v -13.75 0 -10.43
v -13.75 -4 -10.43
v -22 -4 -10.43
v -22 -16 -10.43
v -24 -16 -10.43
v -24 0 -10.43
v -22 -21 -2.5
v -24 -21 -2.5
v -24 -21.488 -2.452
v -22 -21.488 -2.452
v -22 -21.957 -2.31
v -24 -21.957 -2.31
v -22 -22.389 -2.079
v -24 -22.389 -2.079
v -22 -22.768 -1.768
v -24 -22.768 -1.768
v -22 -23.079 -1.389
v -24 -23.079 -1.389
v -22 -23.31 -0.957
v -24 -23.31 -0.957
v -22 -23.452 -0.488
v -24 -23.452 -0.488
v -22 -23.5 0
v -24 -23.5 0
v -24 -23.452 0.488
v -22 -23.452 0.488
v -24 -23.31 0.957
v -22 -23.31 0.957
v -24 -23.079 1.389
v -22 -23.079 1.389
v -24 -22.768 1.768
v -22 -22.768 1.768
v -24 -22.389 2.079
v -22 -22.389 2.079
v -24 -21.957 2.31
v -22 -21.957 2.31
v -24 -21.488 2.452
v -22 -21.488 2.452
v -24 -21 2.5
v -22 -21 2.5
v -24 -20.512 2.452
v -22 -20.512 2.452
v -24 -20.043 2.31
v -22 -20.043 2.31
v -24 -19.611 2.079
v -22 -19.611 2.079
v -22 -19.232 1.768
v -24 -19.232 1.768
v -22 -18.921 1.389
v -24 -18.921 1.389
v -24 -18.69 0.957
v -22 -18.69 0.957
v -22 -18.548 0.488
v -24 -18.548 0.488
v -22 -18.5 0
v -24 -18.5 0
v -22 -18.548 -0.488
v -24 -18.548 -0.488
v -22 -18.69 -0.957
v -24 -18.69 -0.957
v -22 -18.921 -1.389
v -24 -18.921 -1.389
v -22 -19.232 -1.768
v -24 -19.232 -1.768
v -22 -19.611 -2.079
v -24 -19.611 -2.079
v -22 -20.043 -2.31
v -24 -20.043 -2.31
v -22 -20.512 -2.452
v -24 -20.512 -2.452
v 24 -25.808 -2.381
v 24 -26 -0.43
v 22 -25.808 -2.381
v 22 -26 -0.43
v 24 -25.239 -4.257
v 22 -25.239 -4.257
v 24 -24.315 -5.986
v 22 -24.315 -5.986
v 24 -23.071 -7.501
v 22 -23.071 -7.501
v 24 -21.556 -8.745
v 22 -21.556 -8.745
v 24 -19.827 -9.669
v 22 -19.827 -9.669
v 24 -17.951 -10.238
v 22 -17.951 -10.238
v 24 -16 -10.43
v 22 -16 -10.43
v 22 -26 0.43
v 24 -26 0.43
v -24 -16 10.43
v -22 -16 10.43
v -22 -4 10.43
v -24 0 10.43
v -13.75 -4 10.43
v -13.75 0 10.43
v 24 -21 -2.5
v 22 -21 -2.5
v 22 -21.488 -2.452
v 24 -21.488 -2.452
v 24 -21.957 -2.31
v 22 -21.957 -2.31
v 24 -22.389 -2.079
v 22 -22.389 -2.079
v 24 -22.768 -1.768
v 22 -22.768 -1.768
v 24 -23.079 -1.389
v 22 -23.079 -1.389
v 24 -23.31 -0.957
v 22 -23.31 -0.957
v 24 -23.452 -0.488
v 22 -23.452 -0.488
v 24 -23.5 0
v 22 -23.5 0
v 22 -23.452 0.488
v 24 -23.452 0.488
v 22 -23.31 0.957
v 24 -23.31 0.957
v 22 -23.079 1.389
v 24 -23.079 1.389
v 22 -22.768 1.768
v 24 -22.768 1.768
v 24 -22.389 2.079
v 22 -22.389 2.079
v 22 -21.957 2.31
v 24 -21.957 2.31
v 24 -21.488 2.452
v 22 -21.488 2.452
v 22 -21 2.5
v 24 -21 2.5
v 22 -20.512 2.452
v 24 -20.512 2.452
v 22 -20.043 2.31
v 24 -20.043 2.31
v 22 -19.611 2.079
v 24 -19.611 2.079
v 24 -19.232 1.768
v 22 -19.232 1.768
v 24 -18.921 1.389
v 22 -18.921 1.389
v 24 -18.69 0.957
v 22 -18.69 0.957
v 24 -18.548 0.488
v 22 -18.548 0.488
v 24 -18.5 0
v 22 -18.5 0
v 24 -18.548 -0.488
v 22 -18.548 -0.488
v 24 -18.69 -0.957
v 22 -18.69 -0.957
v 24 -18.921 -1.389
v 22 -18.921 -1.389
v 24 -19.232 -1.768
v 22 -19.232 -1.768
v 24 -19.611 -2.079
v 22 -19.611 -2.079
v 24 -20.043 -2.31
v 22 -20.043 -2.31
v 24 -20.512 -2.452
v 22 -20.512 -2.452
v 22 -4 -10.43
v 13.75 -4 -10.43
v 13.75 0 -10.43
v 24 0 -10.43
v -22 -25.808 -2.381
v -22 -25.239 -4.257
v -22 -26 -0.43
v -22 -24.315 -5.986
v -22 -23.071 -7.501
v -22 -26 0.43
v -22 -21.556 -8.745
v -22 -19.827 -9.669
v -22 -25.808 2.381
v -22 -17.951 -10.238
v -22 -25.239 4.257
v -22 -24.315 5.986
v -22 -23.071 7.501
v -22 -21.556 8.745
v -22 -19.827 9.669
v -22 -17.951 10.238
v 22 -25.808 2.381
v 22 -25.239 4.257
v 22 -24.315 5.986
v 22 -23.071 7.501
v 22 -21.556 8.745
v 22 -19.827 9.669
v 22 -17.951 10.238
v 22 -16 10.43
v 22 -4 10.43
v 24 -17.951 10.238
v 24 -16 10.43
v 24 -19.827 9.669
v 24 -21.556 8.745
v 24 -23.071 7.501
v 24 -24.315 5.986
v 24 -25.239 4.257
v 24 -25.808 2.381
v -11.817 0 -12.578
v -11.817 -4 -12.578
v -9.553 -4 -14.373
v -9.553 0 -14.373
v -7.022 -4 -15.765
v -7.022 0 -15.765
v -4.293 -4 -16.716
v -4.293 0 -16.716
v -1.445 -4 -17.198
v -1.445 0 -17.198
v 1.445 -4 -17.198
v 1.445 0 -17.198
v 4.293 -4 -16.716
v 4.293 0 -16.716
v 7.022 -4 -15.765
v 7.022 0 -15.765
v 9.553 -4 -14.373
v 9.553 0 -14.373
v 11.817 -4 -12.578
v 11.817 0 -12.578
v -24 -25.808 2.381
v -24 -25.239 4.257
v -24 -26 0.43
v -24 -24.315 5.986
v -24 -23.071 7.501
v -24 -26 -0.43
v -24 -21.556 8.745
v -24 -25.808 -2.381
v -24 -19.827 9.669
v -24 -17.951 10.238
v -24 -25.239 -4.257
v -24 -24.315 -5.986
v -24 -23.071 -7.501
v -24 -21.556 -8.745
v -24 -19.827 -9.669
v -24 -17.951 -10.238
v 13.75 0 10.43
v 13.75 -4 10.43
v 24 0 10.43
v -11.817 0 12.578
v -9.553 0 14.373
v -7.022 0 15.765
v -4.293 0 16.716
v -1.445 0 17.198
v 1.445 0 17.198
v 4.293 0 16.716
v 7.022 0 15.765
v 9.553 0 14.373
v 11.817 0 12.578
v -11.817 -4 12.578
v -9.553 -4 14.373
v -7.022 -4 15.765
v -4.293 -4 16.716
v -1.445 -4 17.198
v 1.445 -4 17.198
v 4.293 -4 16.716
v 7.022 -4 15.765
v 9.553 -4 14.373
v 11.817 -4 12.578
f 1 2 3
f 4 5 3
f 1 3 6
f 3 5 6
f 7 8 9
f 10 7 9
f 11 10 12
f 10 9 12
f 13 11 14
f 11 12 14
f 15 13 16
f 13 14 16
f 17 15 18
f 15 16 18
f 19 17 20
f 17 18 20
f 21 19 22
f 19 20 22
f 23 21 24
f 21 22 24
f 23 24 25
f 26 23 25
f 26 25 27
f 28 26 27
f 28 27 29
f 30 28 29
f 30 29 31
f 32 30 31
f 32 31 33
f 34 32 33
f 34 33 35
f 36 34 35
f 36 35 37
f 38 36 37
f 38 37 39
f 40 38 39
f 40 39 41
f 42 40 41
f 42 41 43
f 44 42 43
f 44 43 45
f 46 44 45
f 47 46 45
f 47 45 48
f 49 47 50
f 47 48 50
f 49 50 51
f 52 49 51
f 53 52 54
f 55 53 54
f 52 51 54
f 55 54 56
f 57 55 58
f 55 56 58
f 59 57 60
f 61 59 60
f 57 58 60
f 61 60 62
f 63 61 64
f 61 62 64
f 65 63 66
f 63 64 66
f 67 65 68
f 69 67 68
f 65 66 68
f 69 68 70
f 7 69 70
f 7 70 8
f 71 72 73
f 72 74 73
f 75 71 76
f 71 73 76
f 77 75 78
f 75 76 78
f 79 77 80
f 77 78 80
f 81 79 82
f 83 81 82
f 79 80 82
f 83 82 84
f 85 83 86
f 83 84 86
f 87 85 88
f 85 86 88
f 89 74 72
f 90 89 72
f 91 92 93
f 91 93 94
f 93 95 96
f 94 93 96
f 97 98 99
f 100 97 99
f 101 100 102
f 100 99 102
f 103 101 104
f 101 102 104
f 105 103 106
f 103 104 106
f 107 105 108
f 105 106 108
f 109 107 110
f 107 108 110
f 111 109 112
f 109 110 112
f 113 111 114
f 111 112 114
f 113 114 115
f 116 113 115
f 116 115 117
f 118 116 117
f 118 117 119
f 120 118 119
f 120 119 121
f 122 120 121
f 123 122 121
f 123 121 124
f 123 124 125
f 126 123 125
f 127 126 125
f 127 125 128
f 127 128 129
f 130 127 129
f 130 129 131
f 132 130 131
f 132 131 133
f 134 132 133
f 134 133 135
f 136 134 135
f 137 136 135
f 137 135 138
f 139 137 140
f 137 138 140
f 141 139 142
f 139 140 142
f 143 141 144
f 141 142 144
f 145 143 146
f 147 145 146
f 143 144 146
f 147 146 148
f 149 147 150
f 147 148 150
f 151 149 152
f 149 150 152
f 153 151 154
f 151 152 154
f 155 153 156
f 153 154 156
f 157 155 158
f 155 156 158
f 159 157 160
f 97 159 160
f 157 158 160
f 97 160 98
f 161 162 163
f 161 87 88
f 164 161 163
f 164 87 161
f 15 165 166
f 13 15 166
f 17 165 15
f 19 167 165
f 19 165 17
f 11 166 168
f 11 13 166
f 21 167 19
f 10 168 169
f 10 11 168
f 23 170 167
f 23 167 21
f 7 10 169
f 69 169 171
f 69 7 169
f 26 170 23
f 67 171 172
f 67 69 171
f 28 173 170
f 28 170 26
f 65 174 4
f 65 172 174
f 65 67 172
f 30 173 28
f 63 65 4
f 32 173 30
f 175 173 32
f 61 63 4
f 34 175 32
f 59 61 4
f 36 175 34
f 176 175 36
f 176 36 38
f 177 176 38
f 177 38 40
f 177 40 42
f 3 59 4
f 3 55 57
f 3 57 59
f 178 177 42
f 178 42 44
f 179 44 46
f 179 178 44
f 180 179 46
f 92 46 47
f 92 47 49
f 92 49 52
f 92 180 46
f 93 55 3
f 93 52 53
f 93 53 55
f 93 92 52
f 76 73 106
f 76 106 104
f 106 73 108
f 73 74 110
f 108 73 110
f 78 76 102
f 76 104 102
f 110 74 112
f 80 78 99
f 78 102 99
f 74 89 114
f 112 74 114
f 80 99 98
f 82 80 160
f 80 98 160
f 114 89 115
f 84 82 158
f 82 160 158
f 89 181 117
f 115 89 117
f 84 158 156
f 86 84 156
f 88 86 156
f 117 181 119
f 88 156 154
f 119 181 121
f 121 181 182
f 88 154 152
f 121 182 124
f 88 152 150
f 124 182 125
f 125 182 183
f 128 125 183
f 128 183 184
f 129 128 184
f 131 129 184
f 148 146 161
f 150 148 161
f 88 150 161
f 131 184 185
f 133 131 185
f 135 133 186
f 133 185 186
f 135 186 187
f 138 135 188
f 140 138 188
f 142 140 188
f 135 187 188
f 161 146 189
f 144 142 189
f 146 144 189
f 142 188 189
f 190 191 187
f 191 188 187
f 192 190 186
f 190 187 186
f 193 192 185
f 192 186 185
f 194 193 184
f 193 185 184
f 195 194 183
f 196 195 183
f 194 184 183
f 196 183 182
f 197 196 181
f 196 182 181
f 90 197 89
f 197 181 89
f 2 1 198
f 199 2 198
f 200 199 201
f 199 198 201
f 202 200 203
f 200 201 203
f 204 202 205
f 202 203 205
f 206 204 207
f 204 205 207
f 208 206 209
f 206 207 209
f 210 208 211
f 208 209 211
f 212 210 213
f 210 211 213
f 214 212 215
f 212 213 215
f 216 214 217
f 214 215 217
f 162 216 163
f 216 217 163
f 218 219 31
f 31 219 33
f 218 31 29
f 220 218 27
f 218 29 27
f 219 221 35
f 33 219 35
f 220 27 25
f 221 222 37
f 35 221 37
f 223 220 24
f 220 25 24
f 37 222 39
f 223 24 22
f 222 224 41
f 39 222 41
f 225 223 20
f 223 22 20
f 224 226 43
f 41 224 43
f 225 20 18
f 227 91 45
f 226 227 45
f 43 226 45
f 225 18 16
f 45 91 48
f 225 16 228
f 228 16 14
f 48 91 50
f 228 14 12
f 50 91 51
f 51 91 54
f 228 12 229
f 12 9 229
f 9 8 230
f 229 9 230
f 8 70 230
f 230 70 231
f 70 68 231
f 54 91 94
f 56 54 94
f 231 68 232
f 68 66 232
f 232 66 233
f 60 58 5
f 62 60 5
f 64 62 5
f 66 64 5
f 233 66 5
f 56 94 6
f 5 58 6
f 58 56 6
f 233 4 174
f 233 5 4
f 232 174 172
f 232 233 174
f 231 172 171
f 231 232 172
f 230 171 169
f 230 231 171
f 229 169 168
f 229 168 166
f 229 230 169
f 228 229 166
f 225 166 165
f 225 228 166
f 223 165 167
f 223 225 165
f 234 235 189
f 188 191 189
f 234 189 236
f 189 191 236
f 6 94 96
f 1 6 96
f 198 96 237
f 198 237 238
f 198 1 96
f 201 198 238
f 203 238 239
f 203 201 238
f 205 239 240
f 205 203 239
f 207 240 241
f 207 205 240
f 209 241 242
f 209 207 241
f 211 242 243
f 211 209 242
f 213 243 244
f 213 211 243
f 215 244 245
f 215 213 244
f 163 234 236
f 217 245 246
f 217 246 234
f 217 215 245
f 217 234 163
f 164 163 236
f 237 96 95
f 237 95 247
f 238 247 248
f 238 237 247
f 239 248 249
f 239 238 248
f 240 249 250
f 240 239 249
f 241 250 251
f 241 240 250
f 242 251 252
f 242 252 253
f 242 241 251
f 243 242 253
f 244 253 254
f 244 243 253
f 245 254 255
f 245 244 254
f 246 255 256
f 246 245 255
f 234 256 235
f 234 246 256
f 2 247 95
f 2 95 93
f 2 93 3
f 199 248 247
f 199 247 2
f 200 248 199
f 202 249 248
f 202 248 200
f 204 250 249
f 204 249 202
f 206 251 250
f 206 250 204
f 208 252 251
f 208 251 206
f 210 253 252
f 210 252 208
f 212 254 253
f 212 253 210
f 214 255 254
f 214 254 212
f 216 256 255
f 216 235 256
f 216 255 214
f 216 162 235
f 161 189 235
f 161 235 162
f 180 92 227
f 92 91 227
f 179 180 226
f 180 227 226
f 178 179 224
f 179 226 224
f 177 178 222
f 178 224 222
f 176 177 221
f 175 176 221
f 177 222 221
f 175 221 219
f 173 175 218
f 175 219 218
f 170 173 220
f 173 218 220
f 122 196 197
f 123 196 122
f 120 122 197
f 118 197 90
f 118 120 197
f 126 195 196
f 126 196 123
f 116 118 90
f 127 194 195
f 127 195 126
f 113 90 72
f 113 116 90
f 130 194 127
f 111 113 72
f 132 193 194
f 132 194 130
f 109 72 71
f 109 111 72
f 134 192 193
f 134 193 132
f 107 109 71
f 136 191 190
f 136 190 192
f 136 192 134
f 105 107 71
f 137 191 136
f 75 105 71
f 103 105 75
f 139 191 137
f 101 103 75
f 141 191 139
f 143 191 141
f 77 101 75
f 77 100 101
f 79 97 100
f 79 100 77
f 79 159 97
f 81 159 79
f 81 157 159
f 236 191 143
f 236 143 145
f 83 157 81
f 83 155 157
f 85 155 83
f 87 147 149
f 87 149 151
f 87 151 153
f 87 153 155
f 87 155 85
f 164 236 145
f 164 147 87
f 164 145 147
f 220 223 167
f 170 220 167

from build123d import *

# Parameters (mm, degrees)
CROQUIS1_W              = 48
CROQUIS1_H              = 46
SALIENTE_EXTRUIR1_DEPTH = 26
CROQUIS2_W              = 44
CROQUIS2_H              = 22
CORTAR_EXTRUIR1_DEPTH   = 46
CROQUIS3_W              = 12.57
CROQUIS3_H              = 22
CORTAR_EXTRUIR3_DEPTH   = 60.236812878
REDONDEO3_R             = 10
REDONDEO4_R             = 10
CROQUIS16_W             = 12.57
CROQUIS16_H             = 4
CORTAR_EXTRUIR19_DEPTH  = 10.25
CROQUIS21_W             = 12.57
CROQUIS21_H             = 4
CORTAR_EXTRUIR20_DEPTH  = 10.25
CORTAR_EXTRUIR21_DEPTH  = 10.25
CROQUIS23_R             = 2.5
CORTAR_EXTRUIR22_DEPTH  = 53


with BuildPart() as part:
    # Croquis1 → Saliente-Extruir1 (new body)
    with BuildSketch(Plane(origin=(0, 0, 0), x_dir=(1, 0, 0), z_dir=(0, 1, 0))):
        Rectangle(CROQUIS1_W, CROQUIS1_H)
    extrude(amount=-SALIENTE_EXTRUIR1_DEPTH)

    # Croquis2 → Cortar-Extruir1 (cut)
    with BuildSketch(Plane.XY.offset(23)):
        with Locations((0, -15)):
            Rectangle(CROQUIS2_W, CROQUIS2_H)
    extrude(amount=-CORTAR_EXTRUIR1_DEPTH, mode=Mode.SUBTRACT)

    # Croquis3 → Cortar-Extruir3 (cut, through all)
    with BuildSketch(Plane(origin=(24, 0, 0), x_dir=(0, 0, -1), z_dir=(1, 0, 0))):
        with Locations((-16.715, -15)):
            Rectangle(CROQUIS3_W, CROQUIS3_H)
        with Locations((16.715, -15)):
            Rectangle(CROQUIS3_W, CROQUIS3_H)
    extrude(amount=-CORTAR_EXTRUIR3_DEPTH, mode=Mode.SUBTRACT)

    # Redondeo3
    redondeo3_edges = [part.edges().sort_by_distance(p)[0] for p in [
        (23, -26, 10.43),
        (23, -26, -10.43),
    ]]
    fillet(redondeo3_edges, radius=REDONDEO3_R)

    # Redondeo4
    redondeo4_edges = [part.edges().sort_by_distance(p)[0] for p in [
        (-23, -26, 10.43),
        (-23, -26, -10.43),
    ]]
    fillet(redondeo4_edges, radius=REDONDEO4_R)

    # Croquis16 → Cortar-Extruir19 (cut)
    with BuildSketch(Plane.ZY.offset(24)):
        with Locations((-16.715, -2)):
            Rectangle(CROQUIS16_W, CROQUIS16_H)
        with Locations((16.715, -2)):
            Rectangle(CROQUIS16_W, CROQUIS16_H)
    extrude(amount=-CORTAR_EXTRUIR19_DEPTH, mode=Mode.SUBTRACT)

    # Croquis21 → Cortar-Extruir20 (cut)
    with BuildSketch(Plane(origin=(24, 0, 0), x_dir=(0, 0, -1), z_dir=(1, 0, 0))):
        with Locations((-16.715, -2)):
            Rectangle(CROQUIS21_W, CROQUIS21_H)
        with Locations((16.715, -2)):
            Rectangle(CROQUIS21_W, CROQUIS21_H)
    extrude(amount=-CORTAR_EXTRUIR20_DEPTH, mode=Mode.SUBTRACT)

    # Croquis22 → Cortar-Extruir21 (cut)
    with BuildSketch(Plane(origin=(0, 0, 0), x_dir=(1, 0, 0), z_dir=(0, 1, 0))):
        with BuildLine():
            Line((13.75, -10.43), (13.75, -23))
            Line((13.75, -23), (-13.75, -23))
            Line((-13.75, -23), (-13.75, -10.43))
            ThreePointArc((-13.75, -10.43), (0, -17.258255995), (13.75, -10.43))
        make_face()
        with BuildLine():
            Line((13.75, 10.43), (13.75, 23))
            Line((13.75, 23), (-13.75, 23))
            Line((-13.75, 23), (-13.75, 10.43))
            ThreePointArc((-13.75, 10.43), (0, 17.258255995), (13.75, 10.43))
        make_face()
    extrude(amount=-CORTAR_EXTRUIR21_DEPTH, mode=Mode.SUBTRACT)

    # Croquis23 → Cortar-Extruir22 (cut)
    with BuildSketch(Plane.ZY.offset(24)):
        with Locations(Location((0, -21, 0), (0, 0, 180))):
            Circle(CROQUIS23_R)
    extrude(amount=-CORTAR_EXTRUIR22_DEPTH, mode=Mode.SUBTRACT)


solid = part.part
